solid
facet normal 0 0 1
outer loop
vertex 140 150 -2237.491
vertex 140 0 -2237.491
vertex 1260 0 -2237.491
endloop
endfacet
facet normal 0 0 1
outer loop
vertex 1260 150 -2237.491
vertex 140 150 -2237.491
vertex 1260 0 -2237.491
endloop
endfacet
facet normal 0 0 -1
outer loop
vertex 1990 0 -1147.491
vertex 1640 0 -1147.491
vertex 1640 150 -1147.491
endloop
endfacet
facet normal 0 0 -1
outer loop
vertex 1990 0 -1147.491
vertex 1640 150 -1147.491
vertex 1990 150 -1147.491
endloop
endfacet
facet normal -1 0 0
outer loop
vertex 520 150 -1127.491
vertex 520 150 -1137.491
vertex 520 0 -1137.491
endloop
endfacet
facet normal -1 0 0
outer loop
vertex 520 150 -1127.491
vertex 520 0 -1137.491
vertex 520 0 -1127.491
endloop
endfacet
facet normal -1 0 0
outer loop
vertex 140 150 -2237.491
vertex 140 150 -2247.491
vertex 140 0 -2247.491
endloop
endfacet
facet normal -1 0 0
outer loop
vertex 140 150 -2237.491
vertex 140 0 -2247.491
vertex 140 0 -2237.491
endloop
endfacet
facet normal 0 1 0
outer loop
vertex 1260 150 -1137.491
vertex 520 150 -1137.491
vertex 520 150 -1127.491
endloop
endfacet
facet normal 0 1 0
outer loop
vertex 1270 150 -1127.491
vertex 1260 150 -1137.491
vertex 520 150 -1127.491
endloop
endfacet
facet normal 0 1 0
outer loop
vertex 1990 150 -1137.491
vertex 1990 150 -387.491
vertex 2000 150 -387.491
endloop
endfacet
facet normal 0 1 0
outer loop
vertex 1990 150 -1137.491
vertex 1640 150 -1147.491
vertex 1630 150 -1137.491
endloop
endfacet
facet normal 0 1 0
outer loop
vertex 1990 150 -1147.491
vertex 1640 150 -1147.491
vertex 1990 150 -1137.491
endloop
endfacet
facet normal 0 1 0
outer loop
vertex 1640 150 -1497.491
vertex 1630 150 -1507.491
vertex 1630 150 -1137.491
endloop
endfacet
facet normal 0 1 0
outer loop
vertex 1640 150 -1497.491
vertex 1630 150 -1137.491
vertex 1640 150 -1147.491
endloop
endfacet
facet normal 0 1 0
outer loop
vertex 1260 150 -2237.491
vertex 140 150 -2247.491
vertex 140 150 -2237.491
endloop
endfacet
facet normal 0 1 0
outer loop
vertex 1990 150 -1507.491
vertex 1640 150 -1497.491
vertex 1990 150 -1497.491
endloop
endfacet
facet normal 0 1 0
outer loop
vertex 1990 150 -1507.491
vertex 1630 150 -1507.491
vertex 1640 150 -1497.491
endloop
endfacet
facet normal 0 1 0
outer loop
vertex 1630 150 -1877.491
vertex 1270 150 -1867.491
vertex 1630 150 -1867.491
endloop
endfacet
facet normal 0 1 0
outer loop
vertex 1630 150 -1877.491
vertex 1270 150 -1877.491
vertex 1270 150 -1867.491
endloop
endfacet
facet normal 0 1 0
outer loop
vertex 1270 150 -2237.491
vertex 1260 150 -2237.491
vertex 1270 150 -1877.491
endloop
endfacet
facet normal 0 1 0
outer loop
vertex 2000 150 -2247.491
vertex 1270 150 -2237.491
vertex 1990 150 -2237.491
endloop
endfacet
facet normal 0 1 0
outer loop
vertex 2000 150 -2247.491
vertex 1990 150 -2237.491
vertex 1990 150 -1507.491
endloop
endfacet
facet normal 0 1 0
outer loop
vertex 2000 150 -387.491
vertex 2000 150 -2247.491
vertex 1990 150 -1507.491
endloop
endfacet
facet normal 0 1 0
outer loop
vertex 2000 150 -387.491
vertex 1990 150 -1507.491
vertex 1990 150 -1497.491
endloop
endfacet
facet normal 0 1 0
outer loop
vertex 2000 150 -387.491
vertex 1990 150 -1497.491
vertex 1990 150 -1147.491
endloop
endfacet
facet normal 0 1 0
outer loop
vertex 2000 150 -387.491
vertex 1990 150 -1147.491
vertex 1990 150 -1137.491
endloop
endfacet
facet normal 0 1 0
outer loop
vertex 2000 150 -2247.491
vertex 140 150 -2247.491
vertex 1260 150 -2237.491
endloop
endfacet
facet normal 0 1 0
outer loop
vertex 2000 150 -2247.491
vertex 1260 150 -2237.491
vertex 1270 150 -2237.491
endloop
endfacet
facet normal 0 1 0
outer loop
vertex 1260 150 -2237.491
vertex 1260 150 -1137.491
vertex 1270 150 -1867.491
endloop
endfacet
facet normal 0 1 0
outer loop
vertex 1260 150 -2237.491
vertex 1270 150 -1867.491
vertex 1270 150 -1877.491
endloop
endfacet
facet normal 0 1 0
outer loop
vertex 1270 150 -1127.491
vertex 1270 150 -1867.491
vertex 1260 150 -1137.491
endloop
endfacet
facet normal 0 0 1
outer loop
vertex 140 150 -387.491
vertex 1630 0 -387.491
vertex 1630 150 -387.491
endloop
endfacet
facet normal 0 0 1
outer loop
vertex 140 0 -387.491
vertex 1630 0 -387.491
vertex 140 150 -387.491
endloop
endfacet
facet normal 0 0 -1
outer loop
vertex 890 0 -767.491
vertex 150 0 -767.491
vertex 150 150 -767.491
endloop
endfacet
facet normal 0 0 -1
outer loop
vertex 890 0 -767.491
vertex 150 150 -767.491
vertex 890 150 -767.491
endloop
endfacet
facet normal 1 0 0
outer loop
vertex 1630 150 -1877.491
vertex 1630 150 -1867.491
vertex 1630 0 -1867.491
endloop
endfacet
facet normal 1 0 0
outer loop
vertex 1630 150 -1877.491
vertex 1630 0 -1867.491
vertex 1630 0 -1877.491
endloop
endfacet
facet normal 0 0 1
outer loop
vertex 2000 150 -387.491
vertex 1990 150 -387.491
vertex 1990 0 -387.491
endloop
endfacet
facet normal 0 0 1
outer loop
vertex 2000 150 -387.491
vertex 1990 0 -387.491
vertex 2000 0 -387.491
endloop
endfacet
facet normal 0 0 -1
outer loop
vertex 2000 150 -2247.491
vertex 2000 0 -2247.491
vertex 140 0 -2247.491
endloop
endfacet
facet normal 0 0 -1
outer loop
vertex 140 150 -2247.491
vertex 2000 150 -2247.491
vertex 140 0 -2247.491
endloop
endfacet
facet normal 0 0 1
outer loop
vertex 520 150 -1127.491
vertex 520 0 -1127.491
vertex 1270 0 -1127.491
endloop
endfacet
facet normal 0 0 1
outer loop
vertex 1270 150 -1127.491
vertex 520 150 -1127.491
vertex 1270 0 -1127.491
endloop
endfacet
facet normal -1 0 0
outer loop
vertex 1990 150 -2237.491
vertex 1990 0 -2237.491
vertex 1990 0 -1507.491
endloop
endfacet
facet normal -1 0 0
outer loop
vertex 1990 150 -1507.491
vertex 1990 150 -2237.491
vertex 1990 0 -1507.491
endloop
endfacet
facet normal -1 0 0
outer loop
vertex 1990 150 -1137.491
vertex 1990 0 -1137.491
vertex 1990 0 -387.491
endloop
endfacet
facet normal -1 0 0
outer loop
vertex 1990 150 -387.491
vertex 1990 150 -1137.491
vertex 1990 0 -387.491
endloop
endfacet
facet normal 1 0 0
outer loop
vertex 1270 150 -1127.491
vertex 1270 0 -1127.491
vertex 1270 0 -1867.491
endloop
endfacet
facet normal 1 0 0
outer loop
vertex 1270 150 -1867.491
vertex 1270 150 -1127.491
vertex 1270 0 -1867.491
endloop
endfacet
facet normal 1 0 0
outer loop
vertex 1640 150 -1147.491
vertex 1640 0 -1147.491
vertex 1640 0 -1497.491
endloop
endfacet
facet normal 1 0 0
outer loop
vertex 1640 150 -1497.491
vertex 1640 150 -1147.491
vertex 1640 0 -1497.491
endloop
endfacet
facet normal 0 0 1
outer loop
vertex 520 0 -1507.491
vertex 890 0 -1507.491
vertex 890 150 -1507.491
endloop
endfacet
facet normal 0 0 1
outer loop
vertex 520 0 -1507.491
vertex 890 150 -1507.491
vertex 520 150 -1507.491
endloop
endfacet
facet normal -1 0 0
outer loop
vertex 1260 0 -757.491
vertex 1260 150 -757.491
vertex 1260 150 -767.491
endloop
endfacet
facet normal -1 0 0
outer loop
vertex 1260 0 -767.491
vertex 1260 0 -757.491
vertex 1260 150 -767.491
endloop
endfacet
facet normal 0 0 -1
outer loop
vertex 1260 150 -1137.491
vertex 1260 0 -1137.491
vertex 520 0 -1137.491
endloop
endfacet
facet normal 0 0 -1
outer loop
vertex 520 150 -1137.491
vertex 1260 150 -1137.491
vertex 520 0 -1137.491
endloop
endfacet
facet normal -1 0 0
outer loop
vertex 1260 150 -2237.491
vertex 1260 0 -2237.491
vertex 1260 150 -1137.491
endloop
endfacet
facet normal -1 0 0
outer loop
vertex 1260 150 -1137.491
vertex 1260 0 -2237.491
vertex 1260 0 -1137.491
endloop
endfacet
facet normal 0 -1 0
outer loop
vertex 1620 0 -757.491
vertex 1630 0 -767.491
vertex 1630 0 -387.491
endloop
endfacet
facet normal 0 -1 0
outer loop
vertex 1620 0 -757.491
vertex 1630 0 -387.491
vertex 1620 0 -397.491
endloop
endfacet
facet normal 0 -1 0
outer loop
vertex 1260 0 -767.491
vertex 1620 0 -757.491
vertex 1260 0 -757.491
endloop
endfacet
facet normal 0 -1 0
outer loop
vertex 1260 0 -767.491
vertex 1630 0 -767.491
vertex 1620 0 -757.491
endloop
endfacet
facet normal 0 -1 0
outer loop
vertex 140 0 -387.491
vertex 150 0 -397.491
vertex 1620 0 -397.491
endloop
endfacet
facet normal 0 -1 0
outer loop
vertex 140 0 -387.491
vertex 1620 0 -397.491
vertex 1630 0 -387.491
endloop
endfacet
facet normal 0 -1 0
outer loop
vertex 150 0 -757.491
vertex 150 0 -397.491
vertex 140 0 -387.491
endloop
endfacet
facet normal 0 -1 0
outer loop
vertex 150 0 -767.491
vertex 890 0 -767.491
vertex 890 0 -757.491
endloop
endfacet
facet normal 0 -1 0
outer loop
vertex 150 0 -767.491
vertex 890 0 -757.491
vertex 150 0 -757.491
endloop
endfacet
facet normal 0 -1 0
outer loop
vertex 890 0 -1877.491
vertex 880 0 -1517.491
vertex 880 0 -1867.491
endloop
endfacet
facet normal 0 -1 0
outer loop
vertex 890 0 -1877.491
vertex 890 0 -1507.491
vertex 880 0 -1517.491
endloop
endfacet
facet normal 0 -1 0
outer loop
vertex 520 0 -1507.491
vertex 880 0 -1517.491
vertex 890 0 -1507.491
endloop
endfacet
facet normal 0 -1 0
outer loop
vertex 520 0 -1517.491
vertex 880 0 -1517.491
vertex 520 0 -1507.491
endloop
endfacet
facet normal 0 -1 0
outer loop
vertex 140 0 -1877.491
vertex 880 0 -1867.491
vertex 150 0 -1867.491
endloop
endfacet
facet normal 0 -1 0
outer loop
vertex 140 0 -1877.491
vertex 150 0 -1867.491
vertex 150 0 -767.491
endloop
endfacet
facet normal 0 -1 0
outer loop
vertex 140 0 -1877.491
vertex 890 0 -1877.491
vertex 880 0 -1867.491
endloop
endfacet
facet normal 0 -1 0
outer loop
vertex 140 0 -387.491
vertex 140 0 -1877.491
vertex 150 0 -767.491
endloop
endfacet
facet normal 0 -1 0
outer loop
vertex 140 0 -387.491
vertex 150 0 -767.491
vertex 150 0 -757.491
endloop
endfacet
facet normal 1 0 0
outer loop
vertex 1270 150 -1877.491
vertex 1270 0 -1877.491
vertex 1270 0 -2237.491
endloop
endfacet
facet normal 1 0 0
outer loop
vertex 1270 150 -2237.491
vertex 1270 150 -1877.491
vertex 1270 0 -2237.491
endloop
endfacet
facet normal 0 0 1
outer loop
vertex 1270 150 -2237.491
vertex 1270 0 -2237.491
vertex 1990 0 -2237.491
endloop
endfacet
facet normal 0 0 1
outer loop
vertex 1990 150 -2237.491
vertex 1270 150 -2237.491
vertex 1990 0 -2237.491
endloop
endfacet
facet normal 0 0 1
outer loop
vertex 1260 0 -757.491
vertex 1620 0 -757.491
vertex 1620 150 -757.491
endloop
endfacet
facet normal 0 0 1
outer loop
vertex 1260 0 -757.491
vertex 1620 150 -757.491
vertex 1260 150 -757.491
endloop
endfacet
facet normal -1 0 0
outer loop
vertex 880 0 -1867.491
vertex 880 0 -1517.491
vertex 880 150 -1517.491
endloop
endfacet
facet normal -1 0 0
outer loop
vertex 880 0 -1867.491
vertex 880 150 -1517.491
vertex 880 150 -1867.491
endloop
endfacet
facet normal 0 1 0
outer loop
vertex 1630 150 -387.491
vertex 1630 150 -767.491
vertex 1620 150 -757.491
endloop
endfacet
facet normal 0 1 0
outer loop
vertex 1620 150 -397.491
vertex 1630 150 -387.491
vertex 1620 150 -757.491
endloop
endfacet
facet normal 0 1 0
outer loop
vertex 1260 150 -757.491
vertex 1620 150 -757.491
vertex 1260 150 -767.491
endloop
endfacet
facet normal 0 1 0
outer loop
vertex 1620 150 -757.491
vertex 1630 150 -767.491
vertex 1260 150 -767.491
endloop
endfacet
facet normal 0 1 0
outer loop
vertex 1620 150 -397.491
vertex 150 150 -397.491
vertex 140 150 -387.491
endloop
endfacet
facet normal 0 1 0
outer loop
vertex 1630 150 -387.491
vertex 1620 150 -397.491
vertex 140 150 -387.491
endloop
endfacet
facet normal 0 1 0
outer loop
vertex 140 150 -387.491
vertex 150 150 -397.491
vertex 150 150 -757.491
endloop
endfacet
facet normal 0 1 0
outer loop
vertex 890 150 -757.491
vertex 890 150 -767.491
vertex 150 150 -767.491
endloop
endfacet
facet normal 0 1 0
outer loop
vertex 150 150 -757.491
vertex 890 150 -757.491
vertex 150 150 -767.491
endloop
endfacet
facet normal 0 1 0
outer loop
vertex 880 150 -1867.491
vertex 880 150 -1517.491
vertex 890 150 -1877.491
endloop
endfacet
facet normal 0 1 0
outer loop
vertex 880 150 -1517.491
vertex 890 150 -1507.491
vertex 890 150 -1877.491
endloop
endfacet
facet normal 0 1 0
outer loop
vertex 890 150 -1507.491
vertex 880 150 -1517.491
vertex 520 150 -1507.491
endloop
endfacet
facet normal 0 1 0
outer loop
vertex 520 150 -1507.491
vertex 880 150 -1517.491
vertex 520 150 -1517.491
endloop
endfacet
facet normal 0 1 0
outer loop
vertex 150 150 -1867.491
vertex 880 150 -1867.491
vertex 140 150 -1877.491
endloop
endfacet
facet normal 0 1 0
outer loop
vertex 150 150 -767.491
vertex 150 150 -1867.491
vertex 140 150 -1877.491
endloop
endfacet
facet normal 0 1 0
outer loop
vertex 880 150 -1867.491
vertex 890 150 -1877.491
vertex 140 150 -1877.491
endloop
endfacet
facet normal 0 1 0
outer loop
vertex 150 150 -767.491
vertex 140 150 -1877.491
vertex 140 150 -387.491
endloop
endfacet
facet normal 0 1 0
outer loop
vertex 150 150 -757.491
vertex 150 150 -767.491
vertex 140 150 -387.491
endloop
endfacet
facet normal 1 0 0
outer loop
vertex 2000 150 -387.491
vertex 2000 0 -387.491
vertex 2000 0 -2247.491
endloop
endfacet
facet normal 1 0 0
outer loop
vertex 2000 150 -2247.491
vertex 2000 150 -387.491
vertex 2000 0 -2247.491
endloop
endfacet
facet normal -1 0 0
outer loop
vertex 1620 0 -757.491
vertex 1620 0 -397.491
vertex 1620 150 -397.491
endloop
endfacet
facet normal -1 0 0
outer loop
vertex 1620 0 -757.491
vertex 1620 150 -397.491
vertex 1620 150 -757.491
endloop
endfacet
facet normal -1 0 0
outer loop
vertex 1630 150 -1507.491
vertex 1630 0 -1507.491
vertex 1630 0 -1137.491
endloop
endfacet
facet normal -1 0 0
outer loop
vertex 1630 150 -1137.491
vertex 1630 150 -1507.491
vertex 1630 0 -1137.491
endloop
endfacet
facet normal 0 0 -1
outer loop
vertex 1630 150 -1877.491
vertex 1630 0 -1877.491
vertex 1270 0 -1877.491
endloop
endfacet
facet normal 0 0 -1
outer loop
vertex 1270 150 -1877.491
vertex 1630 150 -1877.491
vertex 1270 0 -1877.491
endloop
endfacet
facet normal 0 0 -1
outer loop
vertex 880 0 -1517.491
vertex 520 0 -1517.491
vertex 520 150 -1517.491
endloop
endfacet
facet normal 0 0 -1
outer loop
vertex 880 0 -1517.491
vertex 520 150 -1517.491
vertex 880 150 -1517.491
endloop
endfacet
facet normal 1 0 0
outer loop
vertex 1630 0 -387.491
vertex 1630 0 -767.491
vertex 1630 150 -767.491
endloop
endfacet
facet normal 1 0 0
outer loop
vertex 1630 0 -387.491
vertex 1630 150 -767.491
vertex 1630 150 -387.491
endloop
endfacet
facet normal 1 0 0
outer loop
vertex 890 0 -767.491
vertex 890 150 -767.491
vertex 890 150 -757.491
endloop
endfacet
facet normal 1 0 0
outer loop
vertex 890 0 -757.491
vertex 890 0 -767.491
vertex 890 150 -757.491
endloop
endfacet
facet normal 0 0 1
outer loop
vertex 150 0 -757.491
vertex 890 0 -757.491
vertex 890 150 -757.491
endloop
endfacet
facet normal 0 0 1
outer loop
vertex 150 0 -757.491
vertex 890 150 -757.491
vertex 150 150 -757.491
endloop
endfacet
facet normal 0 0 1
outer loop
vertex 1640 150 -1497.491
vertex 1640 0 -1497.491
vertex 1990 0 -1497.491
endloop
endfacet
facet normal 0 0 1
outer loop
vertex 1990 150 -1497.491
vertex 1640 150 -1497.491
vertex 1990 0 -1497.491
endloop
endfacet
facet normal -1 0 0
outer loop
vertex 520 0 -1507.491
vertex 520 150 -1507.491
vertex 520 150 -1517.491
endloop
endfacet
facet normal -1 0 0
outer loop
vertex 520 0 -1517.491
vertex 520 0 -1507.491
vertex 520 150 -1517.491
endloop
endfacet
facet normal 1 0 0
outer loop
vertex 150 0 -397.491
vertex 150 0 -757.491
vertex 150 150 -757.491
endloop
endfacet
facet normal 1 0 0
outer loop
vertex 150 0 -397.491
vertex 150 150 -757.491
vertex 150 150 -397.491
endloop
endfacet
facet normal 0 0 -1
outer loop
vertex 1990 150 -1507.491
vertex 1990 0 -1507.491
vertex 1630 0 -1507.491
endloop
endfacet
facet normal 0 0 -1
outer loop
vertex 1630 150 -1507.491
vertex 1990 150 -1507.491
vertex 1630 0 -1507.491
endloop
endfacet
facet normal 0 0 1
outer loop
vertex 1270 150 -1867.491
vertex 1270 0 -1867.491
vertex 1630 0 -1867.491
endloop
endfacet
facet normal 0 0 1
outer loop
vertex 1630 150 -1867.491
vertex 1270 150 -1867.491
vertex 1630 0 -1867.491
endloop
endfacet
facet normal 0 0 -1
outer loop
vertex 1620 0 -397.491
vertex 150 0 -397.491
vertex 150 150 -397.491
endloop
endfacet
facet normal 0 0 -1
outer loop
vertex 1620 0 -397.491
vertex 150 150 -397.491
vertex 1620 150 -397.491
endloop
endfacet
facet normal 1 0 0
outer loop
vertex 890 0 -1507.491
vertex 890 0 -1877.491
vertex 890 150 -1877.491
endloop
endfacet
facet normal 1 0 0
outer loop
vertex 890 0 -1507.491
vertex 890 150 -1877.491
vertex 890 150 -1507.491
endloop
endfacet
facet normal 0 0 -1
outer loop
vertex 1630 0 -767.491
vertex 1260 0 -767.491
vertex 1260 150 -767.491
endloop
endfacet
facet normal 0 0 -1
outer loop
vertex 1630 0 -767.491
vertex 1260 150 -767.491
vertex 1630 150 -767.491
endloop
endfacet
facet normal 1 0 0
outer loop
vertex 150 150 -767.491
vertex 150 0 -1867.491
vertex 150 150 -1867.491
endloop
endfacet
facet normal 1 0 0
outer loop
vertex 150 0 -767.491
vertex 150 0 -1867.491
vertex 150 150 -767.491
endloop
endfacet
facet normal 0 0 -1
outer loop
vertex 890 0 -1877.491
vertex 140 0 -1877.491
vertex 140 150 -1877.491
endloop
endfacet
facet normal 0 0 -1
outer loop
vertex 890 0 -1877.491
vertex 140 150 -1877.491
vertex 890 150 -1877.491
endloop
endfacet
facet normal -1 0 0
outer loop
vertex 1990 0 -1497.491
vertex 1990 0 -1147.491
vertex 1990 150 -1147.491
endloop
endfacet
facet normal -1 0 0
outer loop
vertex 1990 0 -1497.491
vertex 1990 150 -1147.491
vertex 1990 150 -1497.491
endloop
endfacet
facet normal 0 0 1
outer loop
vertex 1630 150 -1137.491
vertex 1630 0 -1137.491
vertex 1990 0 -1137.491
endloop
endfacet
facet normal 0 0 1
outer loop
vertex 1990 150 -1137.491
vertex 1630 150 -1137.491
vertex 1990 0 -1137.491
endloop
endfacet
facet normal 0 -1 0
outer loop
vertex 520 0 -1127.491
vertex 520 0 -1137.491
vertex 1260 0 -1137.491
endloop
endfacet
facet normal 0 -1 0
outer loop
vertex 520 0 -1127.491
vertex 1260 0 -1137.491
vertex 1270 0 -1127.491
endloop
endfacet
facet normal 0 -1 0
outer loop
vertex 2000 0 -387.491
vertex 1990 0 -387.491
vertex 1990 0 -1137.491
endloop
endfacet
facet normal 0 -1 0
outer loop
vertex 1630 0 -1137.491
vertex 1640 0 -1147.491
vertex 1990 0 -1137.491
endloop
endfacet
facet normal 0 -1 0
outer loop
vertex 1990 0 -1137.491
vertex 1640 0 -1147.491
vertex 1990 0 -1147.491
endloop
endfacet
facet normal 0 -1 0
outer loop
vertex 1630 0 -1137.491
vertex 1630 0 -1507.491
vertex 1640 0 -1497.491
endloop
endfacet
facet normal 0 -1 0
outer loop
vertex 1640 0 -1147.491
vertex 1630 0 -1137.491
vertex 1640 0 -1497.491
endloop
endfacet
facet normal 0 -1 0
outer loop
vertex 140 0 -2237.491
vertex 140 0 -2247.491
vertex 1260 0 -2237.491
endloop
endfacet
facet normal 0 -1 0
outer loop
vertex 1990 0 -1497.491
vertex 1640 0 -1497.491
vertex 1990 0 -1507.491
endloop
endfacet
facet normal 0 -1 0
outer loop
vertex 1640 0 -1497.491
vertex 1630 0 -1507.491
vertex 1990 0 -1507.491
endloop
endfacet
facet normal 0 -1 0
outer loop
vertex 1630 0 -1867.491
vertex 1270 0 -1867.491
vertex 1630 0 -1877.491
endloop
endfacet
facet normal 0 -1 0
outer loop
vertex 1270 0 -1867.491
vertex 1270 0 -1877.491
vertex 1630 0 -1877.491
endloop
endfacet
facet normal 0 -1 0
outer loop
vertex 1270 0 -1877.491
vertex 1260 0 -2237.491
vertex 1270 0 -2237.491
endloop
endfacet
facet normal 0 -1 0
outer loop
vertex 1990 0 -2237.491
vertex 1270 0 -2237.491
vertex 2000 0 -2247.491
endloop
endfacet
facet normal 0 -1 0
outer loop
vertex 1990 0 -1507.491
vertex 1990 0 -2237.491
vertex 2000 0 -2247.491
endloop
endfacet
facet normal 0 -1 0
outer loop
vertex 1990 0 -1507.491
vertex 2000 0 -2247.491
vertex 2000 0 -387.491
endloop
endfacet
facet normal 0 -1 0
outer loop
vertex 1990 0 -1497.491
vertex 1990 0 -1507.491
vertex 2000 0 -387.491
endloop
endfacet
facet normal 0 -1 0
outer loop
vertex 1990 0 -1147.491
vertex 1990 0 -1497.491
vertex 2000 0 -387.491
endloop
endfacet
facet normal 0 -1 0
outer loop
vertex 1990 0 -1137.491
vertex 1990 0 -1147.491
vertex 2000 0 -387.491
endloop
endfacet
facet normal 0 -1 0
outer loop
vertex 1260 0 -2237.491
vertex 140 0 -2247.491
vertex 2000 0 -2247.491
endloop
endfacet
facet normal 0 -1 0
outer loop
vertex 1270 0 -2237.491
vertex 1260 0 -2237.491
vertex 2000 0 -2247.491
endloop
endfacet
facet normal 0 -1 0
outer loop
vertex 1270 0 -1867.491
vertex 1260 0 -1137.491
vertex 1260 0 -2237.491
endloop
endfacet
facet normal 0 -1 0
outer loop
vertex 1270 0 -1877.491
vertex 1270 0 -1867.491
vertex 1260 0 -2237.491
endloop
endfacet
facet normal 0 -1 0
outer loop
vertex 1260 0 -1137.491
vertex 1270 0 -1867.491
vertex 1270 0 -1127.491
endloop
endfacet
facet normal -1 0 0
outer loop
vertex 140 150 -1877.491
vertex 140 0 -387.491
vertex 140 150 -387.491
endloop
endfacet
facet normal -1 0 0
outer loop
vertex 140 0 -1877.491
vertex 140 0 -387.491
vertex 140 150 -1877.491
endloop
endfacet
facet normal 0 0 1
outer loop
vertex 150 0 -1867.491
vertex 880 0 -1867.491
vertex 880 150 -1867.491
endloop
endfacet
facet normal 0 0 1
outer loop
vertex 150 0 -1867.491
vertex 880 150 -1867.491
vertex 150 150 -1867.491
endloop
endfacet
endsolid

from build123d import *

# Parameters (mm, degrees)
BOSS_EXTRUDE3_DEPTH   = 150
SKETCH2_W             = 350
SKETCH2_H             = 350
BOSS_EXTRUDE3_2_DEPTH = 150


with BuildPart() as part:
    # Sketch2 → Boss-Extrude3 (new body)
    with BuildSketch(Plane(origin=(0, 0, 0), x_dir=(1, 0, 0), z_dir=(0, 1, 0))):
        Polygon((150, 757.491220574), (150, 397.491220574), (1620, 397.491220574), (1620, 757.491220574), (1260, 757.491220574), (1260, 767.491220574), (1630, 767.491220574), (1630, 387.491220574), (140, 387.491220574), (140, 1877.491220574), (890, 1877.491220574), (890, 1507.491220574), (520, 1507.491220574), (520, 1517.491220574), (880, 1517.491220574), (880, 1867.491220574), (150, 1867.491220574), (150, 767.491220574), (890, 767.491220574), (890, 757.491220574), align=None)
    extrude(amount=BOSS_EXTRUDE3_DEPTH)


with BuildPart() as body_2:
    # Sketch2 → Boss-Extrude3 2 (new body)
    with BuildSketch(Plane(origin=(0, 0, 0), x_dir=(1, 0, 0), z_dir=(0, 1, 0))):
        Polygon((2000, 387.491220574), (2000, 2247.491220574), (140, 2247.491220574), (140, 2237.491220574), (1260, 2237.491220574), (1260, 1137.491220574), (520, 1137.491220574), (520, 1127.491220574), (1270, 1127.491220574), (1270, 1867.491220574), (1630, 1867.491220574), (1630, 1877.491220574), (1270, 1877.491220574), (1270, 2237.491220574), (1990, 2237.491220574), (1990, 1507.491220574), (1630, 1507.491220574), (1630, 1137.491220574), (1990, 1137.491220574), (1990, 387.491220574), align=None)
        with Locations((1815, 1322.491220574)):
            Rectangle(SKETCH2_W, SKETCH2_H, mode=Mode.SUBTRACT)
    extrude(amount=BOSS_EXTRUDE3_2_DEPTH)


solid = Compound([part.part, body_2.part])
